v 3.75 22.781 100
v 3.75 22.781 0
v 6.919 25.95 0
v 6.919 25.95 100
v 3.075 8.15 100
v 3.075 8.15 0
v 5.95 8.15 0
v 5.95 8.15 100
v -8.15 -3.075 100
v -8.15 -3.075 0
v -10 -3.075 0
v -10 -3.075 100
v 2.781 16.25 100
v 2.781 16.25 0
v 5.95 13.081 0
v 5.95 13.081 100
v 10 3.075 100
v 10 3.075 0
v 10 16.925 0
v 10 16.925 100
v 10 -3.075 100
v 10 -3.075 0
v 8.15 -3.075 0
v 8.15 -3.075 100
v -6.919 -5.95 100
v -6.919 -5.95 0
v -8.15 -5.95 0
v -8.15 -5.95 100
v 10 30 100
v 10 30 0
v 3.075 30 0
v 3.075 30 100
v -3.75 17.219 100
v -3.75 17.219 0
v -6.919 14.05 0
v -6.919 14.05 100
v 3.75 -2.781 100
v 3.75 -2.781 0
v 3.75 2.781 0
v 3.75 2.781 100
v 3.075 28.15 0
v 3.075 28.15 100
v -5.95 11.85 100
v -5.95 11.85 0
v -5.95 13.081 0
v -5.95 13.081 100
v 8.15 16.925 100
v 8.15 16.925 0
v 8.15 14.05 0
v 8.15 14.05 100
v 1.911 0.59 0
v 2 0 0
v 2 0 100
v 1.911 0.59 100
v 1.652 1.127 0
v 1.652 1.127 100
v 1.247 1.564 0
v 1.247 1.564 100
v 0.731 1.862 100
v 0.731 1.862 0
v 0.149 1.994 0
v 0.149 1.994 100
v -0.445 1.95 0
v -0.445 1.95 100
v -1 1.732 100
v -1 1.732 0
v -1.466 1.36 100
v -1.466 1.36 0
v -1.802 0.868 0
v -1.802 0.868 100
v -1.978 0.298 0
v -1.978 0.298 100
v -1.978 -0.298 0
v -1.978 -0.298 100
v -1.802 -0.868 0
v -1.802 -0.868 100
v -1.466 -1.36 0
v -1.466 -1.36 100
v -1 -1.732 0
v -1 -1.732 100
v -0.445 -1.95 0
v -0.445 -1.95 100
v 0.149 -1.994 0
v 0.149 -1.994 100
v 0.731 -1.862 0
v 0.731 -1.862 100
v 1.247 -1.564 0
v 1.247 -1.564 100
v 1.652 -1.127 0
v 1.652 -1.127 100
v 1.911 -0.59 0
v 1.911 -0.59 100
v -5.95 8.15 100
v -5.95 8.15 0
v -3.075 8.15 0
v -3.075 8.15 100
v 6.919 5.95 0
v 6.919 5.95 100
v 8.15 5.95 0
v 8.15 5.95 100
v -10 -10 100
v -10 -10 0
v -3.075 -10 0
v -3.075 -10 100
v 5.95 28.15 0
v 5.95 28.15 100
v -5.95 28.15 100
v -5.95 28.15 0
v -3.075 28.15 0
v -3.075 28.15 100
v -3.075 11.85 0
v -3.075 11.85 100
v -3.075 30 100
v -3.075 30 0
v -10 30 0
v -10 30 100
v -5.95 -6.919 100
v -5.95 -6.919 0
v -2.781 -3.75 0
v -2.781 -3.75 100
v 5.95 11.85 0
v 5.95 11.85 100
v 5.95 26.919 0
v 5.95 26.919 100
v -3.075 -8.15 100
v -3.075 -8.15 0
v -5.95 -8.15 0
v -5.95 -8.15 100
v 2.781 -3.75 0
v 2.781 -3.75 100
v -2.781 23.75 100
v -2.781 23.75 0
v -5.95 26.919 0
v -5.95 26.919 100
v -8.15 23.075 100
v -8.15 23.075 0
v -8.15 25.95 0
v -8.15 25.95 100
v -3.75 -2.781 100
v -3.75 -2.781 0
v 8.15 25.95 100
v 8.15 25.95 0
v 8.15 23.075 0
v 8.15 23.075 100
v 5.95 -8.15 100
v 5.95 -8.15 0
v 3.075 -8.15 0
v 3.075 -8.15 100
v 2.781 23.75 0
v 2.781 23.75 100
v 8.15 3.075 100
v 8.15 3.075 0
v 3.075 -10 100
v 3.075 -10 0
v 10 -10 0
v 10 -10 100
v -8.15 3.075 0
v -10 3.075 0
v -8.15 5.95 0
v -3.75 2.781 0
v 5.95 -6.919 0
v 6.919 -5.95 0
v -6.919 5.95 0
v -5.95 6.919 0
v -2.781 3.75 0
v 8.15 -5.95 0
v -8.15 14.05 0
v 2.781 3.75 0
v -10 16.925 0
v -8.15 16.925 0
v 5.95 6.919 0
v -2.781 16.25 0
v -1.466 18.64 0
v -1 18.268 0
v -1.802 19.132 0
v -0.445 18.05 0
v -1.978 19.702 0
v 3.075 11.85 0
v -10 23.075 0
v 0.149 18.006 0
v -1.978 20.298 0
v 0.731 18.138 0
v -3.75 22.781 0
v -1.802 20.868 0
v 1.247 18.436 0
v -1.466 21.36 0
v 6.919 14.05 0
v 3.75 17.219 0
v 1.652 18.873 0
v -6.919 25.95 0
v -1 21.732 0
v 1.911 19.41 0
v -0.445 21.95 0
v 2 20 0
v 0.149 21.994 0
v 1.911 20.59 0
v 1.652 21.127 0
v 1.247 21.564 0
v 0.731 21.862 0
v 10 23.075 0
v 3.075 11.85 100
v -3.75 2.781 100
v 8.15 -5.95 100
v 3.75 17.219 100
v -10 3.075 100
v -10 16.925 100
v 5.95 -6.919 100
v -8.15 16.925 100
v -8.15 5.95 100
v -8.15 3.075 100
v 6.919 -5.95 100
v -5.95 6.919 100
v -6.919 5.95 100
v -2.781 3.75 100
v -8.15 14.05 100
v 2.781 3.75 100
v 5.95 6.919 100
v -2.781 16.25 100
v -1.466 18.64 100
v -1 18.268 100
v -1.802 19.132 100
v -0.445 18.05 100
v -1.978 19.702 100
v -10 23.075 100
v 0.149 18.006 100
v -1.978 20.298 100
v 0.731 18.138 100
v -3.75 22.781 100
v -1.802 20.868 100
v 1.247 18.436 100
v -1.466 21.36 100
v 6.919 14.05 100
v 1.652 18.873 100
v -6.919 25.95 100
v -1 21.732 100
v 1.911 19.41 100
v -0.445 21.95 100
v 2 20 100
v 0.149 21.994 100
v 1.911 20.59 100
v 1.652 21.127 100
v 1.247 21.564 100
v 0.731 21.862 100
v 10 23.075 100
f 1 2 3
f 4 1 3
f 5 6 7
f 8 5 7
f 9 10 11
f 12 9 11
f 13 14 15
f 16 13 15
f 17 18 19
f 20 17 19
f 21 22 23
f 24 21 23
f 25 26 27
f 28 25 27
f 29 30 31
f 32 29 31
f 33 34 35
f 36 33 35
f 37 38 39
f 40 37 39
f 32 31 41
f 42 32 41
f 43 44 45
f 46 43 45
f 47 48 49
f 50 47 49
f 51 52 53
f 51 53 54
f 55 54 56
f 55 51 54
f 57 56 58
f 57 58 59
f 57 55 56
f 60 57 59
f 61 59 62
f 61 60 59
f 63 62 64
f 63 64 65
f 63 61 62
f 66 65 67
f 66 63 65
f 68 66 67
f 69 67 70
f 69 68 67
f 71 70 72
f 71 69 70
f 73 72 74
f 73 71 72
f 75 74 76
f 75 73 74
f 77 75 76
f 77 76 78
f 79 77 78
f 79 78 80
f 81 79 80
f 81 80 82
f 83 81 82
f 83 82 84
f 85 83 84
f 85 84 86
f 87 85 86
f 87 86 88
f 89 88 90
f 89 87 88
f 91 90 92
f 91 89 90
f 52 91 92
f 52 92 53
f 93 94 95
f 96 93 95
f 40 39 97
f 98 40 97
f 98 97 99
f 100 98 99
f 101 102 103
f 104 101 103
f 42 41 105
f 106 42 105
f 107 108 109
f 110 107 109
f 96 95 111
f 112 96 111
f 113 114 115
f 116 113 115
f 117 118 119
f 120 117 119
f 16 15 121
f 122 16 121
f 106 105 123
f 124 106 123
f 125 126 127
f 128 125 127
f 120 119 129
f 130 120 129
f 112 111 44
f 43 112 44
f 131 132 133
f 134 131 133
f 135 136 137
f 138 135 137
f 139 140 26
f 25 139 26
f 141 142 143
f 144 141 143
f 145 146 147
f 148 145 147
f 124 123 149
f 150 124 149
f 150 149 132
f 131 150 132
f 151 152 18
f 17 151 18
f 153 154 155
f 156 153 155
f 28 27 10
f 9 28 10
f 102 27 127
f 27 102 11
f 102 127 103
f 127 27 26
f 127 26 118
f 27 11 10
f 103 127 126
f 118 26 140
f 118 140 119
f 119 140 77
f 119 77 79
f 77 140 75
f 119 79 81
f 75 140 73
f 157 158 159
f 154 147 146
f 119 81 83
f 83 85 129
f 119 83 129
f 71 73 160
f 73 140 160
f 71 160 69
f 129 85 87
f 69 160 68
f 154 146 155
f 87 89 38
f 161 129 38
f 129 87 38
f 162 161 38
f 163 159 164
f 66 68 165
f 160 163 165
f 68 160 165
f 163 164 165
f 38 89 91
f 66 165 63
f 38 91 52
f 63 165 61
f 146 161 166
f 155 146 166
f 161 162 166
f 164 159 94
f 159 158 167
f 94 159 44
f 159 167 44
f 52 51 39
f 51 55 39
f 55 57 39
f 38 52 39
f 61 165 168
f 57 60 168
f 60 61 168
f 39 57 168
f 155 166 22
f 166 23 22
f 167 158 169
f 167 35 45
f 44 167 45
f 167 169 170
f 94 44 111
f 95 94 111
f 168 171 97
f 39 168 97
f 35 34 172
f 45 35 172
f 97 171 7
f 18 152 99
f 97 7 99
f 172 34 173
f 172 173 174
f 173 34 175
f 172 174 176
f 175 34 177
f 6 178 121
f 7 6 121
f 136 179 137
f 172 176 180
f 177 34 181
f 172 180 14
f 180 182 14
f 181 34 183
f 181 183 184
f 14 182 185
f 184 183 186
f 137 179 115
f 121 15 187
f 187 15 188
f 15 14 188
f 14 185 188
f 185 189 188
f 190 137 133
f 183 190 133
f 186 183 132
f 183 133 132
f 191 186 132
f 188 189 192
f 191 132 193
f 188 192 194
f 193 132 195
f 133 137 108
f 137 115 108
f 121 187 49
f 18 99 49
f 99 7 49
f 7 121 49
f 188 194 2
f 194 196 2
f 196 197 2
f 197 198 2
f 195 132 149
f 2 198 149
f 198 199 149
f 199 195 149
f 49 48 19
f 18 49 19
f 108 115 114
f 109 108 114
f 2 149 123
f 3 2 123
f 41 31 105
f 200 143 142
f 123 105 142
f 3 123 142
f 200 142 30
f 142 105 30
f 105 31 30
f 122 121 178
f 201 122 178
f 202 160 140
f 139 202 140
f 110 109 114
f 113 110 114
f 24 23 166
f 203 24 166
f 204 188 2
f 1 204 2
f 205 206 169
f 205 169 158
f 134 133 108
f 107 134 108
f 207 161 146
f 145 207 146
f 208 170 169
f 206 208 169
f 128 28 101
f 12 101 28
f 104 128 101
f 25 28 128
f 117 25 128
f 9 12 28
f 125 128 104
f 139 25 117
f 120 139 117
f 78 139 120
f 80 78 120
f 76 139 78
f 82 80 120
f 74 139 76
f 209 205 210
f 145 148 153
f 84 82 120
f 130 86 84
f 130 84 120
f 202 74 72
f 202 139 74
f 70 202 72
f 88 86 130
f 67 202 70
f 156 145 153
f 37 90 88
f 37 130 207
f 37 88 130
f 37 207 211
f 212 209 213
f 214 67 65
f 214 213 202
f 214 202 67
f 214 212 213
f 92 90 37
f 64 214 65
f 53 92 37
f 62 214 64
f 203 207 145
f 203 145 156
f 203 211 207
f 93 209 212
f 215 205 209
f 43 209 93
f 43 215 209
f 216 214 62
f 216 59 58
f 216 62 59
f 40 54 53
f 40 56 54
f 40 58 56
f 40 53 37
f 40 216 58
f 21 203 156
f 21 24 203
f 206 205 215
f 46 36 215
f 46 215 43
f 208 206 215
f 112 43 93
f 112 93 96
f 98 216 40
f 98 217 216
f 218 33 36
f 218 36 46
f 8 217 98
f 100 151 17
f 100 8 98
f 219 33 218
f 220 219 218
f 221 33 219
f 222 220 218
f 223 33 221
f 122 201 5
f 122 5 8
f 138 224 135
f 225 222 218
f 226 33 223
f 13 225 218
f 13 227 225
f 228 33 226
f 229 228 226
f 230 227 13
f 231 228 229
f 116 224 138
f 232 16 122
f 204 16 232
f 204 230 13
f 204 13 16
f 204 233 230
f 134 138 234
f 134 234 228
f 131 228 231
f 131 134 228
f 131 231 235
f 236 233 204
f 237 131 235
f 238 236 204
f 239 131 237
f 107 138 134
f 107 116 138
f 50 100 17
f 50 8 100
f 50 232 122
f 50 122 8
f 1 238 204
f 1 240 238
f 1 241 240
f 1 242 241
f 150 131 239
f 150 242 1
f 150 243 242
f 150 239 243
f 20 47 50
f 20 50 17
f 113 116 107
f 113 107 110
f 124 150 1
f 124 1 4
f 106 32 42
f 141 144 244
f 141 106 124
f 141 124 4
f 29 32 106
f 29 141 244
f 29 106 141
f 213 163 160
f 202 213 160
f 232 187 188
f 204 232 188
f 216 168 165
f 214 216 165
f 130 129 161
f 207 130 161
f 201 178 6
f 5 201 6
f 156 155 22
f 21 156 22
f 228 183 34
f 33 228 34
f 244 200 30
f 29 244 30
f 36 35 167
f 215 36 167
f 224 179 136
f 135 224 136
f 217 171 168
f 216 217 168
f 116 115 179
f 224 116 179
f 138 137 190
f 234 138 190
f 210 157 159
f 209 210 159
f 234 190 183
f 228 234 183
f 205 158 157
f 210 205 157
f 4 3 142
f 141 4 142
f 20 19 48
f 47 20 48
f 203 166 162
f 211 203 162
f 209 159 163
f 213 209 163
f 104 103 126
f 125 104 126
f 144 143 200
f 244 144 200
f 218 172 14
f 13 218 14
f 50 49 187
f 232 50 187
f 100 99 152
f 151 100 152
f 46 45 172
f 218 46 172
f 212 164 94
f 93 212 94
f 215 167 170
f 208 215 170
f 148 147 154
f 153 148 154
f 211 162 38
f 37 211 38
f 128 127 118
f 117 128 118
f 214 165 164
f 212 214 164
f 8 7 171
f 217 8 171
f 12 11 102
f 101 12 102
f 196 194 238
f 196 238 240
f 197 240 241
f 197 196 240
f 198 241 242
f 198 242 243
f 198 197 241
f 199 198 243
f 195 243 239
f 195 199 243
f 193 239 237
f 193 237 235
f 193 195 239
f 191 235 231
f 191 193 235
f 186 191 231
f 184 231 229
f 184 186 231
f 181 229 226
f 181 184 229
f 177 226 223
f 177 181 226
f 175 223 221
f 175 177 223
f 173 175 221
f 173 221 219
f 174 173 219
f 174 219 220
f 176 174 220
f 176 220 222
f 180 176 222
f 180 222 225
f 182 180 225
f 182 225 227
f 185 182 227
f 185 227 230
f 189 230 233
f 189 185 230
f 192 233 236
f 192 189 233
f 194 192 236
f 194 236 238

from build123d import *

# Parameters (mm, degrees)
SKETCH1_R           = 2
BOSS_EXTRUDE1_DEPTH = 100
LPATTERN1_COUNT     = 2
LPATTERN1_PITCH     = 20


with BuildPart() as part:
    # Sketch1 → Boss-Extrude1 (new body)
    with BuildSketch(Plane.XY):
        Polygon((-10, 3.075), (-8.15, 3.075), (-8.15, 5.95), (-6.91873629, 5.95), (-3.75, 2.78126371), (-3.75, 0), (-3.75, -2.78126371), (-6.91873629, -5.95), (-8.15, -5.95), (-8.15, -3.075), (-10, -3.075), (-10, -10), (-3.075, -10), (-3.075, -8.15), (-5.95, -8.15), (-5.95, -6.91873629), (-2.78126371, -3.75), (0, -3.75), (2.78126371, -3.75), (5.95, -6.91873629), (5.95, -8.15), (3.075, -8.15), (3.075, -10), (10, -10), (10, -3.075), (8.15, -3.075), (8.15, -5.95), (6.91873629, -5.95), (3.75, -2.78126371), (3.75, 0), (3.75, 2.78126371), (6.91873629, 5.95), (8.15, 5.95), (8.15, 3.075), (10, 3.075), (10, 10), (3.075, 10), (3.075, 8.15), (5.95, 8.15), (5.95, 6.91873629), (2.78126371, 3.75), (0, 3.75), (-2.78126371, 3.75), (-5.95, 6.91873629), (-5.95, 8.15), (-3.075, 8.15), (-3.075, 10), (-10, 10), align=None)
        Circle(SKETCH1_R, mode=Mode.SUBTRACT)
    boss_extrude1 = extrude(amount=BOSS_EXTRUDE1_DEPTH)

    # LPattern1: Boss-Extrude1 ×2
    with Locations(*[(0, i * LPATTERN1_PITCH, 0) for i in range(1, LPATTERN1_COUNT)]):
        add(boss_extrude1)


solid = part.part
